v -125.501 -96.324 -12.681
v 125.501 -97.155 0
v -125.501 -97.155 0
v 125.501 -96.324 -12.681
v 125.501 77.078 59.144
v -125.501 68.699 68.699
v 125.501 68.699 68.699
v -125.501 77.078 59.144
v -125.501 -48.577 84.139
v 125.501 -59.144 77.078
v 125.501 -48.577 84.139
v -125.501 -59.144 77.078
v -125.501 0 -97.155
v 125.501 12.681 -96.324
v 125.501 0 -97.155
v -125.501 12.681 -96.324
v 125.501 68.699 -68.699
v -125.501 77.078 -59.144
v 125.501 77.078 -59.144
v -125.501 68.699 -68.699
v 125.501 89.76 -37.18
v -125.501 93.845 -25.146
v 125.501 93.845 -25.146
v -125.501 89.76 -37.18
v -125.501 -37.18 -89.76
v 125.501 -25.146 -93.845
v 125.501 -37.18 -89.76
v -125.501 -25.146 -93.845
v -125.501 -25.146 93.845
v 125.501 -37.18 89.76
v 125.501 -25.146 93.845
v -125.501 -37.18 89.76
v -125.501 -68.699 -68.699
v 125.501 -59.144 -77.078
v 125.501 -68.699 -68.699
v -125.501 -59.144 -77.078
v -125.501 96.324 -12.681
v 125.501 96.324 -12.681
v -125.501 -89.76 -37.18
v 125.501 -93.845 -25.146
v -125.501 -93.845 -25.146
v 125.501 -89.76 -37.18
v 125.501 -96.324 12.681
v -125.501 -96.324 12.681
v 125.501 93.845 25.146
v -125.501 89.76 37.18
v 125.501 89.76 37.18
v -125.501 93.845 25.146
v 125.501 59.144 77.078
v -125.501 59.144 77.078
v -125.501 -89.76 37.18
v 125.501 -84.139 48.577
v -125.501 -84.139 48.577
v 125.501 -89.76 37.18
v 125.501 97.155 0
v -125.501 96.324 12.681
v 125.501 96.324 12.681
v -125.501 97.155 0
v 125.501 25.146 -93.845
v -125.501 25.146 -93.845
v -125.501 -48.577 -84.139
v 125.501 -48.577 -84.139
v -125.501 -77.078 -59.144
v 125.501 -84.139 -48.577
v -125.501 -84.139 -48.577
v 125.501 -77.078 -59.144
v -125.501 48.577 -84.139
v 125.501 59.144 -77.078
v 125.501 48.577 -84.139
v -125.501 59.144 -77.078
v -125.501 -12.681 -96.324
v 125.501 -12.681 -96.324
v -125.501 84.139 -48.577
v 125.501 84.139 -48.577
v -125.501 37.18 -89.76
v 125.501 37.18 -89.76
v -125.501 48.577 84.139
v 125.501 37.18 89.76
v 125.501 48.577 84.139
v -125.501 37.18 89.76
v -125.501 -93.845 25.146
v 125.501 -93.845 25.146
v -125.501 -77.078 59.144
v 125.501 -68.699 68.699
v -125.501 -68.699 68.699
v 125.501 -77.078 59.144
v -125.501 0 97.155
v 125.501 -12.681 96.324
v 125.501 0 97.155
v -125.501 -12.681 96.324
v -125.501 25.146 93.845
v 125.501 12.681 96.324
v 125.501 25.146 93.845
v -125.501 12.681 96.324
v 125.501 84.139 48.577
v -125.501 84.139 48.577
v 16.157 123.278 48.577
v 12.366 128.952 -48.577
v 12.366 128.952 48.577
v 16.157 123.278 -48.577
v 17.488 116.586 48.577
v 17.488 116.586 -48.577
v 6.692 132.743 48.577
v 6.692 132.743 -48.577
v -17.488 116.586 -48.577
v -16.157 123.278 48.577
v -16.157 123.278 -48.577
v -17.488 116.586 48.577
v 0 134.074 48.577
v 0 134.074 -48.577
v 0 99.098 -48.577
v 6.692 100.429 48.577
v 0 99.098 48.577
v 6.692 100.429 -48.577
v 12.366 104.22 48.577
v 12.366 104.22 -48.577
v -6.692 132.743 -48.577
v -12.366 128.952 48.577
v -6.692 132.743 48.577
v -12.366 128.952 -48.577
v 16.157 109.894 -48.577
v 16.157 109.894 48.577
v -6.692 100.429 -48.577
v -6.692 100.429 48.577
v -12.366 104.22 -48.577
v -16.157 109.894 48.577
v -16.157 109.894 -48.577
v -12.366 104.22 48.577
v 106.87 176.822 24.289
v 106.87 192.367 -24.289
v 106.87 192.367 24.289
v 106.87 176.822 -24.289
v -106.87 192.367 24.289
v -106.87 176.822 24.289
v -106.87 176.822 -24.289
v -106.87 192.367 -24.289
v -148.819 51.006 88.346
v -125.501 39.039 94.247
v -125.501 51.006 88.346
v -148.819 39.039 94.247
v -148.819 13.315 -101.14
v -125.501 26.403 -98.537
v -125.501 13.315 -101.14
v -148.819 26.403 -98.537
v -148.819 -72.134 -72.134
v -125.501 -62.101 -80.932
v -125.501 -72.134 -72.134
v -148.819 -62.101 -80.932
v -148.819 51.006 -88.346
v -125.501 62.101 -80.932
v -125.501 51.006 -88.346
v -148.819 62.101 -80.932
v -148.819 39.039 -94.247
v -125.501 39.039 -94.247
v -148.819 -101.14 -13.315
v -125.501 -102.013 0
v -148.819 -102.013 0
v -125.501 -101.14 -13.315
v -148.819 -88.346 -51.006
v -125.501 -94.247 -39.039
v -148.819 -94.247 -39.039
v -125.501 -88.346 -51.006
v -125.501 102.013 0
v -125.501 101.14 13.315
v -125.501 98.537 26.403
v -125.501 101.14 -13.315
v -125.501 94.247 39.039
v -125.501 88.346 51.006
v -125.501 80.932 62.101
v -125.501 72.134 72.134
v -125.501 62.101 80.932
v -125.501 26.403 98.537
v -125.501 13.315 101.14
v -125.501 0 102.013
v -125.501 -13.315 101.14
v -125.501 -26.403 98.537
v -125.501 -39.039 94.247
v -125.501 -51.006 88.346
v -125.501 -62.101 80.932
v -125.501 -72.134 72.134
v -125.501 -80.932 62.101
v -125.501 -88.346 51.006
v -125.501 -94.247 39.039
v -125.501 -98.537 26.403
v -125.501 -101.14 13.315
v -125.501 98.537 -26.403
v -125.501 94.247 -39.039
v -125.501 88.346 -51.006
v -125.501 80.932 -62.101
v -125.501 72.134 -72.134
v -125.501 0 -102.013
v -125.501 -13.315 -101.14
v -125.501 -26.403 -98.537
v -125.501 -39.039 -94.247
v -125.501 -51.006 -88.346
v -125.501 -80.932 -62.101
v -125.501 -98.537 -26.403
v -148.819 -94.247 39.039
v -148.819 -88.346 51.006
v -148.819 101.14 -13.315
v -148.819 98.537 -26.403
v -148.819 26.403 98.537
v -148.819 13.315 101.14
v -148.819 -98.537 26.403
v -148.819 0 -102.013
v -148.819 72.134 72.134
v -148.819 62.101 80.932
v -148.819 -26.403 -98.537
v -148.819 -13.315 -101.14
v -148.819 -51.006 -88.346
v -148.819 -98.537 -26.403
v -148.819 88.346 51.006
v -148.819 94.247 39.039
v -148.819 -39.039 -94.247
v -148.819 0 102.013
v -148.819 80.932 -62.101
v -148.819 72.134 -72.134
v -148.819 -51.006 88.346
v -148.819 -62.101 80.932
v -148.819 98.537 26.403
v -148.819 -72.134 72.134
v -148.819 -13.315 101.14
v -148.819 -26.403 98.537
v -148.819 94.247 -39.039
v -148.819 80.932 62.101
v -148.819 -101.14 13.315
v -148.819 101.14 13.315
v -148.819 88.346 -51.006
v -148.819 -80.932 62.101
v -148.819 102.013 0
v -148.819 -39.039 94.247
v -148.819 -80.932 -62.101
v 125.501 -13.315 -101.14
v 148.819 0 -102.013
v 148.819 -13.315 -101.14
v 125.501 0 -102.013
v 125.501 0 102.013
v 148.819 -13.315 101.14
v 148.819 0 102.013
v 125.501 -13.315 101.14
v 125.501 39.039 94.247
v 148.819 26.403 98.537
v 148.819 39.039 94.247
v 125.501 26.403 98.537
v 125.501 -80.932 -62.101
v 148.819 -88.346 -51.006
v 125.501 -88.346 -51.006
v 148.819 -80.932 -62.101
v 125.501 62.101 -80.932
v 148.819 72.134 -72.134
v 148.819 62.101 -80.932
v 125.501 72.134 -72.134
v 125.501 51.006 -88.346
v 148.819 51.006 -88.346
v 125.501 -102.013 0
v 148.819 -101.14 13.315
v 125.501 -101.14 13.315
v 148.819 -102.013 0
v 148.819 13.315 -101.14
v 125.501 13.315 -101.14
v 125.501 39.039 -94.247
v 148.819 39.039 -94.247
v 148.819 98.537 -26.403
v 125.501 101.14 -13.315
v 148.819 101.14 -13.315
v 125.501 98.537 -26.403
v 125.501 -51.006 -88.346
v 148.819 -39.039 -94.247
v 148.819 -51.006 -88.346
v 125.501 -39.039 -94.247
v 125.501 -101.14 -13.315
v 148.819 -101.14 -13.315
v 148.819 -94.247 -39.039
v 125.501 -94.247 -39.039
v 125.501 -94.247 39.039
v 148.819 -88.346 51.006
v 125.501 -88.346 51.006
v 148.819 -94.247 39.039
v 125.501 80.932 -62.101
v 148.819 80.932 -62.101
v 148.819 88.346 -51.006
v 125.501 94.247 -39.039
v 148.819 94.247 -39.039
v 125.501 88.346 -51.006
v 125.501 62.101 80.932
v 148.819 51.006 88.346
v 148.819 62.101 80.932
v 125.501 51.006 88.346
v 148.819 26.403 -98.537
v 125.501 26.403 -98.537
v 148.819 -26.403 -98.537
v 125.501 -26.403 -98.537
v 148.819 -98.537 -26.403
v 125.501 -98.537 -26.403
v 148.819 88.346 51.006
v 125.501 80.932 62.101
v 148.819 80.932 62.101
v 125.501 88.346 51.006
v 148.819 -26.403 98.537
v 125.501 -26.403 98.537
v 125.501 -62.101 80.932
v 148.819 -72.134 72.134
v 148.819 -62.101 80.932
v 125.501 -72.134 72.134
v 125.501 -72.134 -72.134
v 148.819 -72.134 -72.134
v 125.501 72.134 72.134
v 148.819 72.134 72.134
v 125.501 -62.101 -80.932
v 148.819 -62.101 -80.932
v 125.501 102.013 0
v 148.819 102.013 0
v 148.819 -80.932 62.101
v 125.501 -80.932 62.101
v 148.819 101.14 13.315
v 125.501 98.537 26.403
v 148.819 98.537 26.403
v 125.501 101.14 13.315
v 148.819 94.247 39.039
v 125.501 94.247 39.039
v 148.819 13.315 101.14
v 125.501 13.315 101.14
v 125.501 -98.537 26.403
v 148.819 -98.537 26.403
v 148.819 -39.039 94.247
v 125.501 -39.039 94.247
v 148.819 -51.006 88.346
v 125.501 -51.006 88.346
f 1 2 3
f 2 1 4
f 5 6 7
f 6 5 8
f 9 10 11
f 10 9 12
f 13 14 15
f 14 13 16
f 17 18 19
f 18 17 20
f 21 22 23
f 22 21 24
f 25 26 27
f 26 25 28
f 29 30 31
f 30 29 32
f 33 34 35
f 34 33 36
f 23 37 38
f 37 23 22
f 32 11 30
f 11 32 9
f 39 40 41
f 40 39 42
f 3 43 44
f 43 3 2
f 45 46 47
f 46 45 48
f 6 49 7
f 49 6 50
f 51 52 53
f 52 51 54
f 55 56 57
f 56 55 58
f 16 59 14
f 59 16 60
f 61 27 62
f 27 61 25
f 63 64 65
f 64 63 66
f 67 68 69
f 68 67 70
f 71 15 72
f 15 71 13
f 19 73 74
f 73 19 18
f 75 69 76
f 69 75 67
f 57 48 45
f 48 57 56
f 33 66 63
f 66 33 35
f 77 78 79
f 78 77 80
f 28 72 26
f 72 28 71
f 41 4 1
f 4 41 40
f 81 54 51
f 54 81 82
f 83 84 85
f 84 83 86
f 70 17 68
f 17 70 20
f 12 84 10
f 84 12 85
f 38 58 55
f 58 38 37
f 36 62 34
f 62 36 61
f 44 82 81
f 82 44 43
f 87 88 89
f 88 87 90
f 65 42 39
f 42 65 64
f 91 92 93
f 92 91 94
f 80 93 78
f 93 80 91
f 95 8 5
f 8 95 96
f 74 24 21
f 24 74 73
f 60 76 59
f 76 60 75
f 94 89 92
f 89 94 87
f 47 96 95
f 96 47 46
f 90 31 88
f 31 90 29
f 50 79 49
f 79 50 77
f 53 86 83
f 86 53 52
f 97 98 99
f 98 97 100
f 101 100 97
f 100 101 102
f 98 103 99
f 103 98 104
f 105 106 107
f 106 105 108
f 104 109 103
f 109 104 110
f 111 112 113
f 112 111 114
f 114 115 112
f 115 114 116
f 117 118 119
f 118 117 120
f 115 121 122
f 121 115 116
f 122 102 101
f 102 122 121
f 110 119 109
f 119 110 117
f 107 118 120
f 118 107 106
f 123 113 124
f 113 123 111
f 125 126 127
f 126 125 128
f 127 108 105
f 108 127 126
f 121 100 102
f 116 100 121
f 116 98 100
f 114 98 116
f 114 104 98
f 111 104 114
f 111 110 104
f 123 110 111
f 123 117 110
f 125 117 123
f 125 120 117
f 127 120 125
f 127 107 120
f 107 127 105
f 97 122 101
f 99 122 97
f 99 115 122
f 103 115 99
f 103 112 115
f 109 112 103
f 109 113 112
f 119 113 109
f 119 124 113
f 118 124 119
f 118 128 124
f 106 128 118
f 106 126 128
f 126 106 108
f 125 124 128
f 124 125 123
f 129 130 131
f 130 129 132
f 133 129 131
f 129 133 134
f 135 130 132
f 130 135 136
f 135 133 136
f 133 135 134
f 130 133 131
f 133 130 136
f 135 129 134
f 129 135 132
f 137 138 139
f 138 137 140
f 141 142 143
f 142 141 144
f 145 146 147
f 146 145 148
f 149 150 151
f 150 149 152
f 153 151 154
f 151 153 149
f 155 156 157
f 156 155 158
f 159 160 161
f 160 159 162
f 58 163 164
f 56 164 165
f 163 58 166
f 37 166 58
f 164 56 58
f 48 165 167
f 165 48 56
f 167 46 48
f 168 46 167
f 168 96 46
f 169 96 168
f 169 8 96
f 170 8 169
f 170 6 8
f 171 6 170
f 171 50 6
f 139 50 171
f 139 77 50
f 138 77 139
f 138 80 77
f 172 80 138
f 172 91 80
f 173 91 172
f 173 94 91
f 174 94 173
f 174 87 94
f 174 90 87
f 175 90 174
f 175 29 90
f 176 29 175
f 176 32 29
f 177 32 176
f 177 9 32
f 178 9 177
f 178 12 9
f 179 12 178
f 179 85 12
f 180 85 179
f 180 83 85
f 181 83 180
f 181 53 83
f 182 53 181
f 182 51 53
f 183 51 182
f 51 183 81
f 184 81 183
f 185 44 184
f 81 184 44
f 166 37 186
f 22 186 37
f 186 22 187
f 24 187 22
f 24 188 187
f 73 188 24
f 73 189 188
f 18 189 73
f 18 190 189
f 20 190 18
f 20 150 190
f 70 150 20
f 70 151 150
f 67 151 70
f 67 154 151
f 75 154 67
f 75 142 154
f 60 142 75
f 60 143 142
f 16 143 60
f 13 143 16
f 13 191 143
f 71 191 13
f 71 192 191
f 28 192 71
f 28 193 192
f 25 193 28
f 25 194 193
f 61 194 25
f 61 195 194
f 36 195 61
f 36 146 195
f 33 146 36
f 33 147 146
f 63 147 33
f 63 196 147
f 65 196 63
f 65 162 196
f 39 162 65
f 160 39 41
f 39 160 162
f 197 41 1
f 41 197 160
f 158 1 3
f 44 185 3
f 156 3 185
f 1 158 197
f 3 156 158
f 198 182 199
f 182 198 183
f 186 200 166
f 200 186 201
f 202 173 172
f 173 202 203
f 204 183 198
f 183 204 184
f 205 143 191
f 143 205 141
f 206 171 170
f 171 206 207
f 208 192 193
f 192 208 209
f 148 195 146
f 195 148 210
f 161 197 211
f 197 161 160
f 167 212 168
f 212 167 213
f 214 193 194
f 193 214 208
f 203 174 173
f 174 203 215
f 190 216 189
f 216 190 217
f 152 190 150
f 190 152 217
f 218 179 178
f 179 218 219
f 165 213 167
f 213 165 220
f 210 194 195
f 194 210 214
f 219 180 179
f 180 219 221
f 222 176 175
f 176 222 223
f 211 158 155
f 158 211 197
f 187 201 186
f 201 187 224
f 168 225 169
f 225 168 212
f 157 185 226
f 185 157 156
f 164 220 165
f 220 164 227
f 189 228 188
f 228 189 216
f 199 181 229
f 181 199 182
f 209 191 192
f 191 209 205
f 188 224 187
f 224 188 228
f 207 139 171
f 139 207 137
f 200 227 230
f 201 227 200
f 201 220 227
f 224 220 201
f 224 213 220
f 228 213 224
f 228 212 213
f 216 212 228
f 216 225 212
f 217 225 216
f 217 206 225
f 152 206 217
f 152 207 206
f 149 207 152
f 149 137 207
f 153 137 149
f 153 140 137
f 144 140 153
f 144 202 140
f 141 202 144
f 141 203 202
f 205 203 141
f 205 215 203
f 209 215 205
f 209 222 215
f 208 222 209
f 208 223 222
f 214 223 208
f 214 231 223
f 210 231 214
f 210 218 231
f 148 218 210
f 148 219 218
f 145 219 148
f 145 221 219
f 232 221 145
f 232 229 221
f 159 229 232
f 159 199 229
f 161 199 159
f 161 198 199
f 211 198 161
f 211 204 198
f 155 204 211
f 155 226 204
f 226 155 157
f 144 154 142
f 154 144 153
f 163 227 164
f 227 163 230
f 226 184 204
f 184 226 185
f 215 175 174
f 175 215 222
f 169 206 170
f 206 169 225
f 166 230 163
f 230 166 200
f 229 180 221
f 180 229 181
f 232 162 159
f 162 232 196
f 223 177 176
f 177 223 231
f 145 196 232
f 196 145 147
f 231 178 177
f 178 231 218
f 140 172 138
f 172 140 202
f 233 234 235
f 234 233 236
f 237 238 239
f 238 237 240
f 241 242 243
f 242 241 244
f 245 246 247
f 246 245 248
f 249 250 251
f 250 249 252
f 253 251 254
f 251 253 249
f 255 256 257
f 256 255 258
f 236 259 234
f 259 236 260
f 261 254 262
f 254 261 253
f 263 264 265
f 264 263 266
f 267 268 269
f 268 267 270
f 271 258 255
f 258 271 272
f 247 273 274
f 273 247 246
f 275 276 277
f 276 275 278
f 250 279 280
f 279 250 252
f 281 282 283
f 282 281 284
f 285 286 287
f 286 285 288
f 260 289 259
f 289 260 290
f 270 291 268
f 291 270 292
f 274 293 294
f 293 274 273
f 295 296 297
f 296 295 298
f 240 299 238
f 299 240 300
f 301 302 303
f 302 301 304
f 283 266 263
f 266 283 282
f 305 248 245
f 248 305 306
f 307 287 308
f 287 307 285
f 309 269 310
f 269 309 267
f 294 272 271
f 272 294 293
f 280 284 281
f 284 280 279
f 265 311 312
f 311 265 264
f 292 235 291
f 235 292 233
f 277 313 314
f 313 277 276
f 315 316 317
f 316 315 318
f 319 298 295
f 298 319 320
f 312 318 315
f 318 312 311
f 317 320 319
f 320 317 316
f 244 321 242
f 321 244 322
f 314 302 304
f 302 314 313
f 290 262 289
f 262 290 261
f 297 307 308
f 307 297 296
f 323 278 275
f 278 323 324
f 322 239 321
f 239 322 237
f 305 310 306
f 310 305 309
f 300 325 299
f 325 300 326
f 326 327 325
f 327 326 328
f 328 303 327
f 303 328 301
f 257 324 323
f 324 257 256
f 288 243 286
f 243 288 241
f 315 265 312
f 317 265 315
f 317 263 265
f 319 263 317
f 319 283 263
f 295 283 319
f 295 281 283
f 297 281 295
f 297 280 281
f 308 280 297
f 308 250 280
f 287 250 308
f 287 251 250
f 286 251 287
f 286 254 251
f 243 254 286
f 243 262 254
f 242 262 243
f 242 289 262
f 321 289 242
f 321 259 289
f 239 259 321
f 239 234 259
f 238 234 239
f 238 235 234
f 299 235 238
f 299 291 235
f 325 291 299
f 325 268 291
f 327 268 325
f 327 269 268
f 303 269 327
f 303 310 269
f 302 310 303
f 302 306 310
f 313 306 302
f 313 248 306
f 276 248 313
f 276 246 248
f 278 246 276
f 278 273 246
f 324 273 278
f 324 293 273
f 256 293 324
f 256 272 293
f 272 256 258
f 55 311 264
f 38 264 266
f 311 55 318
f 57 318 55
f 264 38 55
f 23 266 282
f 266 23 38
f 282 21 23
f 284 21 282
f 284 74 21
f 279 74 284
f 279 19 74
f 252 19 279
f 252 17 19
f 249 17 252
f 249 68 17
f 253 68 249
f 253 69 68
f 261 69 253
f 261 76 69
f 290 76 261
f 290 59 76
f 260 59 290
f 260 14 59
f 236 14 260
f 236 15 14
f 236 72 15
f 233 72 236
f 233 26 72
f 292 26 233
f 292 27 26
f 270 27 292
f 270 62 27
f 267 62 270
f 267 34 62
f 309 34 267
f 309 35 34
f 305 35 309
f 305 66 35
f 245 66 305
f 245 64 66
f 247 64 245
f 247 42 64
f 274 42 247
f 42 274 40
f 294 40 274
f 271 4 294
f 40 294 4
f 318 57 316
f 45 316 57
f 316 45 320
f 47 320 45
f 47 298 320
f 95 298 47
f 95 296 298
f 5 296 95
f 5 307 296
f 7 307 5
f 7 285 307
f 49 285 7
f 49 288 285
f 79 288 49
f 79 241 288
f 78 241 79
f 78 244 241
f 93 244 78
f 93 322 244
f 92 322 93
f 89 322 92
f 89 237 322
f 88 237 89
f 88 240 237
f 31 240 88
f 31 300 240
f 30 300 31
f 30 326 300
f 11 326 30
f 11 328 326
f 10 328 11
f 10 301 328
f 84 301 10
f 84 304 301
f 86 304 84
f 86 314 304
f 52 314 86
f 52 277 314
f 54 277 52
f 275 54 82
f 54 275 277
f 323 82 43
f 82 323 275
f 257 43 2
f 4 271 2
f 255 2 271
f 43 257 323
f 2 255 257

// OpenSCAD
// Auto-generated by scripts/author_from_manifest.py (Phase D.3).
// Source: data/phase_d_manifest.json (sku_intent='nibco-f619-osy-gate-4in').
// Do not hand-edit — regenerate from the manifest.
//
// @part nibco_f619_osy_gate_4in
// @kind valve
// @category valve.gate
// @display-name "Nibco F-619 OS&Y Gate Valve 4\" Flanged"
// @mfg nibco
// @mfg-pn F-619
// @listing UL FM
// @price-usd 400.00
// @install-minutes 35
// @crew foreman
// @param size_in number default=4 label="Size" unit="in"
// @port inlet position=[-0.05,0,0] direction=[-1,0,0] style=grooved size_in=4 role=run_a
// @port outlet position=[0.05,0,0] direction=[1,0,0] style=grooved size_in=4 role=run_b

size_in = 4.0;

function od_mm(nps) =
    nps ==   1  ? 33.4 :
    nps == 1.25 ? 42.2 :
    nps == 1.5  ? 48.3 :
    nps ==   2  ? 60.3 :
    nps == 2.5  ? 73.0 :
    nps ==   3  ? 88.9 :
    nps ==   4  ? 114.3 :
    nps ==   6  ? 168.3 :
    nps ==   8  ? 219.1 : 73.0;

od = od_mm(size_in);
body_len = od * 2.4;
body_d   = od * 1.7;

union() {
    // Valve body
    rotate([0, 90, 0])
        cylinder(h = body_len, d = body_d, center = true, $fn = 48);
    // Stem / handle indicator
    translate([0, body_d * 0.6, 0])
        cylinder(h = body_d * 0.5, d = body_d * 0.18, center = true, $fn = 16);
    translate([0, body_d * 0.95, 0])
        cube([body_d * 1.1, body_d * 0.08, body_d * 0.25], center = true);
    // End flanges
    translate([-body_len/2, 0, 0])
        rotate([0, 90, 0])
        cylinder(h = body_d * 0.12, d = body_d * 1.05, center = true, $fn = 48);
    translate([ body_len/2, 0, 0])
        rotate([0, 90, 0])
        cylinder(h = body_d * 0.12, d = body_d * 1.05, center = true, $fn = 48);
}
